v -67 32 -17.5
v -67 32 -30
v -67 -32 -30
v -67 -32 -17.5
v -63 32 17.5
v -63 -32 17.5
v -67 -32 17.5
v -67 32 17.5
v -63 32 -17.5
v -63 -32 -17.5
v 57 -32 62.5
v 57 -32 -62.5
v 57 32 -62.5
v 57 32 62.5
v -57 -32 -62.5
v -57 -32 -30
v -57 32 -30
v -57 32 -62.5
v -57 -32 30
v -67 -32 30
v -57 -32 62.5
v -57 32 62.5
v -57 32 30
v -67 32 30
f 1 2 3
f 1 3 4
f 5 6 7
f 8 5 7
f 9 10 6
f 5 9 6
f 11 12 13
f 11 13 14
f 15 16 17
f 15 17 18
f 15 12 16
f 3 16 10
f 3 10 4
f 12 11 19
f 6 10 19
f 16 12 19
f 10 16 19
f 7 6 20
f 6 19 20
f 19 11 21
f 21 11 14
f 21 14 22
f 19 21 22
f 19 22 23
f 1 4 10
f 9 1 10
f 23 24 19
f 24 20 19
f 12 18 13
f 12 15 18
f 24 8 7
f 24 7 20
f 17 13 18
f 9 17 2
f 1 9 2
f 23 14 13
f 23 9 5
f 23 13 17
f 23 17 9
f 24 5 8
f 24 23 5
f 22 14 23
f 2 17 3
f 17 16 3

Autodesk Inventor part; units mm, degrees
ref_plane "YZ Plane" through (0, 0, 0) normal (1, 0, 0) x (0, 1, 0)
ref_plane "XZ Plane" through (0, 0, 0) normal (0, 1, 0) x (-1, 0, 0)
ref_plane "XY Plane" through (0, 0, 0) normal (0, 0, 1) x (1, 0, 0)
sketch "Sketch2" plane through (0, 0, 0) normal (0, 1, 0) x (-1, 0, 0)
  line L0 (57, -62.5) -> (-57, -62.5)
  line L1 (-57, -62.5) -> (-57, 62.5)
  line L2 (-57, 62.5) -> (57, 62.5)
  line L3 (57, 62.5) -> (57, -62.5)
  line L4 (57, -62.5) -> (-57, 62.5) construction
  line L5 (-57, -62.5) -> (57, 62.5) construction
  line L6 (57, 30) -> (57, -30)
  line L7 (57, -30) -> (67, -30)
  line L8 (67, -30) -> (67, 30)
  line L9 (67, 30) -> (57, 30)
  line L10 (67, 17.5) -> (67, -17.5)
  line L11 (67, -17.5) -> (63, -17.5)
  line L12 (63, -17.5) -> (63, 17.5)
  line L13 (63, 17.5) -> (67, 17.5)
  line L14 (63, 0) -> (57, 0) construction
  line L15 (67, 0) -> (57, 0) construction
  line L16 (67, 0) -> (57, 0) construction
  point P0 (0, 0)
  dimension "d0" = 114
  dimension "d1" = 125
  dimension "d2" = 6
  dimension "d3" = 10
  dimension "d4" = 35
  dimension "d5" = 60
  dimension "d6" = 12.5
extrude "Extrusion1" add sketch "Sketch2" along normal mid plane 64 contours L0 L1 L2 L3 | L3 L9 L8 L13 L12 L11 L7
properties part number "MW_WDR_240_24"
